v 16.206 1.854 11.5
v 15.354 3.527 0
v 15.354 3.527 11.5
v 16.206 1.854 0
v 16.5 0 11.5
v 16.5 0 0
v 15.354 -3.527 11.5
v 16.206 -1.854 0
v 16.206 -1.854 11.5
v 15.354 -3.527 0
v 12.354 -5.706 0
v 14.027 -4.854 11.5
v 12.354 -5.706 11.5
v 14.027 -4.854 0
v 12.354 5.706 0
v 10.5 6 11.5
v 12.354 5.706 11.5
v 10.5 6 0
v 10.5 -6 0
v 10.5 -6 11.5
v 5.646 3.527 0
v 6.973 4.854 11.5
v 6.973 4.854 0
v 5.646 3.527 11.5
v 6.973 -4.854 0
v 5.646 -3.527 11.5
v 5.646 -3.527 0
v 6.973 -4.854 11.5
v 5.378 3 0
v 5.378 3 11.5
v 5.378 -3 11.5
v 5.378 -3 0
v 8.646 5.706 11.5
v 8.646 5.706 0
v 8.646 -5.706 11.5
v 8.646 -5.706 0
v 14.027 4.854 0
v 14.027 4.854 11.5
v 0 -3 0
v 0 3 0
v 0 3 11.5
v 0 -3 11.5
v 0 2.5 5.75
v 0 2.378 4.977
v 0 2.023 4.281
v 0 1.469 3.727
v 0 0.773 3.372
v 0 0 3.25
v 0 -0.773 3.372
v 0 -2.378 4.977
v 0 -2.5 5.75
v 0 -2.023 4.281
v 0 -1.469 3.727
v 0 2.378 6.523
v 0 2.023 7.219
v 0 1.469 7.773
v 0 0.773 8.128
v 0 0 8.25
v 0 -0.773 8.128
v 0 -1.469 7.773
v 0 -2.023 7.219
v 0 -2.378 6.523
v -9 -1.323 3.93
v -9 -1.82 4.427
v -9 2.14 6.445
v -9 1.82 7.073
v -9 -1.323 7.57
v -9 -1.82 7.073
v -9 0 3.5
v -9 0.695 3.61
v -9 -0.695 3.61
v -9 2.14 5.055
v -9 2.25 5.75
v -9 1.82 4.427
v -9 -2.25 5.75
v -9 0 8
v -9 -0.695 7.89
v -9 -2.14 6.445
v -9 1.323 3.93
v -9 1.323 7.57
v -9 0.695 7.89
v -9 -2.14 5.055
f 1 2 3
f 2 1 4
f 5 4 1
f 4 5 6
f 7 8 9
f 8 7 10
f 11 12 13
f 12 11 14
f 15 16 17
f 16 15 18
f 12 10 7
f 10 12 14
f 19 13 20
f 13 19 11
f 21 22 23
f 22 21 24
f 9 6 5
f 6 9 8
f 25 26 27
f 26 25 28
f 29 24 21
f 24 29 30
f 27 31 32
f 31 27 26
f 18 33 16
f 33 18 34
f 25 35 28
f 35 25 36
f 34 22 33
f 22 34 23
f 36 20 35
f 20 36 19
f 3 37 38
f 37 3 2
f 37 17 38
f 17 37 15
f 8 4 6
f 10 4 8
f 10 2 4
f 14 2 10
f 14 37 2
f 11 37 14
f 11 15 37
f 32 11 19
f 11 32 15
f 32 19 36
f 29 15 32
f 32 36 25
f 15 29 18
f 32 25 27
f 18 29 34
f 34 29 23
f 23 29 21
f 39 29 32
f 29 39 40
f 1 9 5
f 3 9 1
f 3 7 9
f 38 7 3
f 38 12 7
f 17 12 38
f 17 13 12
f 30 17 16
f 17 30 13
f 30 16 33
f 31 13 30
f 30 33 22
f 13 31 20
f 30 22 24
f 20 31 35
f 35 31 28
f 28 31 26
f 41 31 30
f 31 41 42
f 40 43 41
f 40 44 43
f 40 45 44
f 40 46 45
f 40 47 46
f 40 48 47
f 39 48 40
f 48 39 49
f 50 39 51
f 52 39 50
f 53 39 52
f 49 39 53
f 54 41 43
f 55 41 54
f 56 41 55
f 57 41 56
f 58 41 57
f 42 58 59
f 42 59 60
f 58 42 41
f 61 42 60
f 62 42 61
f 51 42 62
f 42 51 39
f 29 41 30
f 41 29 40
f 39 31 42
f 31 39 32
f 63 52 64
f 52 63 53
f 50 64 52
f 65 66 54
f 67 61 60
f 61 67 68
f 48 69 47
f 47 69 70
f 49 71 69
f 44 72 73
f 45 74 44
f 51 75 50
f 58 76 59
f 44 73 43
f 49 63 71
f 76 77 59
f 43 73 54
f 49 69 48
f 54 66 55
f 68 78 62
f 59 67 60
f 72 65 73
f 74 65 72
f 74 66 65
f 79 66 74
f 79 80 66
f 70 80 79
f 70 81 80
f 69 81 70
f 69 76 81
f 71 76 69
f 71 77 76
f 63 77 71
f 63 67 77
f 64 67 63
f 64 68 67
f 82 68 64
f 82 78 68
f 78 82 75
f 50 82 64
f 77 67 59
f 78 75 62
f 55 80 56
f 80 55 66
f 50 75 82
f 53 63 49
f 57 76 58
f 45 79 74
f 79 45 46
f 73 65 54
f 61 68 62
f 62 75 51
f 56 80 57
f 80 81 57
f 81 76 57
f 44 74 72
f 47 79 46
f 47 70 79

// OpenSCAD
$fn = 20;
knobD = 12; // Measured: hole = 13, knob 12
slotW = 6; // Measured: Hole is 7 width is 6ish
knobCenter = 16.5 - 12/2; // measured; 18mm from end to end
pegDepth = 9; // measured: 10.5
pegD = 5; // measured: 5
trackH = 11.5; // measured: 12

peg();
//translate([0,20,0])peg();
//translate([0,-20,0])peg();
module peg(){
translate([knobCenter,0,0])cylinder(r = knobD/2, h = trackH);
translate([0,-slotW/2,0])cube([knobCenter, slotW, trackH]);
translate([-pegDepth,0,trackH/2])rotate([0,90,0])cylinder(r1=pegD/2*0.9,r2=pegD/2,h = pegDepth);
}


//supportW = pegD*.6;
//difference(){
//translate([-pegDepth,-supportW/2,0])cube([pegDepth-1,supportW,trackH/2]);
//translate([-pegDepth,0,trackH/2])rotate([0,90,0])cylinder(r1=pegD/2*0.8+.3,r2=pegD/2+.3,h = pegDepth);
//};
